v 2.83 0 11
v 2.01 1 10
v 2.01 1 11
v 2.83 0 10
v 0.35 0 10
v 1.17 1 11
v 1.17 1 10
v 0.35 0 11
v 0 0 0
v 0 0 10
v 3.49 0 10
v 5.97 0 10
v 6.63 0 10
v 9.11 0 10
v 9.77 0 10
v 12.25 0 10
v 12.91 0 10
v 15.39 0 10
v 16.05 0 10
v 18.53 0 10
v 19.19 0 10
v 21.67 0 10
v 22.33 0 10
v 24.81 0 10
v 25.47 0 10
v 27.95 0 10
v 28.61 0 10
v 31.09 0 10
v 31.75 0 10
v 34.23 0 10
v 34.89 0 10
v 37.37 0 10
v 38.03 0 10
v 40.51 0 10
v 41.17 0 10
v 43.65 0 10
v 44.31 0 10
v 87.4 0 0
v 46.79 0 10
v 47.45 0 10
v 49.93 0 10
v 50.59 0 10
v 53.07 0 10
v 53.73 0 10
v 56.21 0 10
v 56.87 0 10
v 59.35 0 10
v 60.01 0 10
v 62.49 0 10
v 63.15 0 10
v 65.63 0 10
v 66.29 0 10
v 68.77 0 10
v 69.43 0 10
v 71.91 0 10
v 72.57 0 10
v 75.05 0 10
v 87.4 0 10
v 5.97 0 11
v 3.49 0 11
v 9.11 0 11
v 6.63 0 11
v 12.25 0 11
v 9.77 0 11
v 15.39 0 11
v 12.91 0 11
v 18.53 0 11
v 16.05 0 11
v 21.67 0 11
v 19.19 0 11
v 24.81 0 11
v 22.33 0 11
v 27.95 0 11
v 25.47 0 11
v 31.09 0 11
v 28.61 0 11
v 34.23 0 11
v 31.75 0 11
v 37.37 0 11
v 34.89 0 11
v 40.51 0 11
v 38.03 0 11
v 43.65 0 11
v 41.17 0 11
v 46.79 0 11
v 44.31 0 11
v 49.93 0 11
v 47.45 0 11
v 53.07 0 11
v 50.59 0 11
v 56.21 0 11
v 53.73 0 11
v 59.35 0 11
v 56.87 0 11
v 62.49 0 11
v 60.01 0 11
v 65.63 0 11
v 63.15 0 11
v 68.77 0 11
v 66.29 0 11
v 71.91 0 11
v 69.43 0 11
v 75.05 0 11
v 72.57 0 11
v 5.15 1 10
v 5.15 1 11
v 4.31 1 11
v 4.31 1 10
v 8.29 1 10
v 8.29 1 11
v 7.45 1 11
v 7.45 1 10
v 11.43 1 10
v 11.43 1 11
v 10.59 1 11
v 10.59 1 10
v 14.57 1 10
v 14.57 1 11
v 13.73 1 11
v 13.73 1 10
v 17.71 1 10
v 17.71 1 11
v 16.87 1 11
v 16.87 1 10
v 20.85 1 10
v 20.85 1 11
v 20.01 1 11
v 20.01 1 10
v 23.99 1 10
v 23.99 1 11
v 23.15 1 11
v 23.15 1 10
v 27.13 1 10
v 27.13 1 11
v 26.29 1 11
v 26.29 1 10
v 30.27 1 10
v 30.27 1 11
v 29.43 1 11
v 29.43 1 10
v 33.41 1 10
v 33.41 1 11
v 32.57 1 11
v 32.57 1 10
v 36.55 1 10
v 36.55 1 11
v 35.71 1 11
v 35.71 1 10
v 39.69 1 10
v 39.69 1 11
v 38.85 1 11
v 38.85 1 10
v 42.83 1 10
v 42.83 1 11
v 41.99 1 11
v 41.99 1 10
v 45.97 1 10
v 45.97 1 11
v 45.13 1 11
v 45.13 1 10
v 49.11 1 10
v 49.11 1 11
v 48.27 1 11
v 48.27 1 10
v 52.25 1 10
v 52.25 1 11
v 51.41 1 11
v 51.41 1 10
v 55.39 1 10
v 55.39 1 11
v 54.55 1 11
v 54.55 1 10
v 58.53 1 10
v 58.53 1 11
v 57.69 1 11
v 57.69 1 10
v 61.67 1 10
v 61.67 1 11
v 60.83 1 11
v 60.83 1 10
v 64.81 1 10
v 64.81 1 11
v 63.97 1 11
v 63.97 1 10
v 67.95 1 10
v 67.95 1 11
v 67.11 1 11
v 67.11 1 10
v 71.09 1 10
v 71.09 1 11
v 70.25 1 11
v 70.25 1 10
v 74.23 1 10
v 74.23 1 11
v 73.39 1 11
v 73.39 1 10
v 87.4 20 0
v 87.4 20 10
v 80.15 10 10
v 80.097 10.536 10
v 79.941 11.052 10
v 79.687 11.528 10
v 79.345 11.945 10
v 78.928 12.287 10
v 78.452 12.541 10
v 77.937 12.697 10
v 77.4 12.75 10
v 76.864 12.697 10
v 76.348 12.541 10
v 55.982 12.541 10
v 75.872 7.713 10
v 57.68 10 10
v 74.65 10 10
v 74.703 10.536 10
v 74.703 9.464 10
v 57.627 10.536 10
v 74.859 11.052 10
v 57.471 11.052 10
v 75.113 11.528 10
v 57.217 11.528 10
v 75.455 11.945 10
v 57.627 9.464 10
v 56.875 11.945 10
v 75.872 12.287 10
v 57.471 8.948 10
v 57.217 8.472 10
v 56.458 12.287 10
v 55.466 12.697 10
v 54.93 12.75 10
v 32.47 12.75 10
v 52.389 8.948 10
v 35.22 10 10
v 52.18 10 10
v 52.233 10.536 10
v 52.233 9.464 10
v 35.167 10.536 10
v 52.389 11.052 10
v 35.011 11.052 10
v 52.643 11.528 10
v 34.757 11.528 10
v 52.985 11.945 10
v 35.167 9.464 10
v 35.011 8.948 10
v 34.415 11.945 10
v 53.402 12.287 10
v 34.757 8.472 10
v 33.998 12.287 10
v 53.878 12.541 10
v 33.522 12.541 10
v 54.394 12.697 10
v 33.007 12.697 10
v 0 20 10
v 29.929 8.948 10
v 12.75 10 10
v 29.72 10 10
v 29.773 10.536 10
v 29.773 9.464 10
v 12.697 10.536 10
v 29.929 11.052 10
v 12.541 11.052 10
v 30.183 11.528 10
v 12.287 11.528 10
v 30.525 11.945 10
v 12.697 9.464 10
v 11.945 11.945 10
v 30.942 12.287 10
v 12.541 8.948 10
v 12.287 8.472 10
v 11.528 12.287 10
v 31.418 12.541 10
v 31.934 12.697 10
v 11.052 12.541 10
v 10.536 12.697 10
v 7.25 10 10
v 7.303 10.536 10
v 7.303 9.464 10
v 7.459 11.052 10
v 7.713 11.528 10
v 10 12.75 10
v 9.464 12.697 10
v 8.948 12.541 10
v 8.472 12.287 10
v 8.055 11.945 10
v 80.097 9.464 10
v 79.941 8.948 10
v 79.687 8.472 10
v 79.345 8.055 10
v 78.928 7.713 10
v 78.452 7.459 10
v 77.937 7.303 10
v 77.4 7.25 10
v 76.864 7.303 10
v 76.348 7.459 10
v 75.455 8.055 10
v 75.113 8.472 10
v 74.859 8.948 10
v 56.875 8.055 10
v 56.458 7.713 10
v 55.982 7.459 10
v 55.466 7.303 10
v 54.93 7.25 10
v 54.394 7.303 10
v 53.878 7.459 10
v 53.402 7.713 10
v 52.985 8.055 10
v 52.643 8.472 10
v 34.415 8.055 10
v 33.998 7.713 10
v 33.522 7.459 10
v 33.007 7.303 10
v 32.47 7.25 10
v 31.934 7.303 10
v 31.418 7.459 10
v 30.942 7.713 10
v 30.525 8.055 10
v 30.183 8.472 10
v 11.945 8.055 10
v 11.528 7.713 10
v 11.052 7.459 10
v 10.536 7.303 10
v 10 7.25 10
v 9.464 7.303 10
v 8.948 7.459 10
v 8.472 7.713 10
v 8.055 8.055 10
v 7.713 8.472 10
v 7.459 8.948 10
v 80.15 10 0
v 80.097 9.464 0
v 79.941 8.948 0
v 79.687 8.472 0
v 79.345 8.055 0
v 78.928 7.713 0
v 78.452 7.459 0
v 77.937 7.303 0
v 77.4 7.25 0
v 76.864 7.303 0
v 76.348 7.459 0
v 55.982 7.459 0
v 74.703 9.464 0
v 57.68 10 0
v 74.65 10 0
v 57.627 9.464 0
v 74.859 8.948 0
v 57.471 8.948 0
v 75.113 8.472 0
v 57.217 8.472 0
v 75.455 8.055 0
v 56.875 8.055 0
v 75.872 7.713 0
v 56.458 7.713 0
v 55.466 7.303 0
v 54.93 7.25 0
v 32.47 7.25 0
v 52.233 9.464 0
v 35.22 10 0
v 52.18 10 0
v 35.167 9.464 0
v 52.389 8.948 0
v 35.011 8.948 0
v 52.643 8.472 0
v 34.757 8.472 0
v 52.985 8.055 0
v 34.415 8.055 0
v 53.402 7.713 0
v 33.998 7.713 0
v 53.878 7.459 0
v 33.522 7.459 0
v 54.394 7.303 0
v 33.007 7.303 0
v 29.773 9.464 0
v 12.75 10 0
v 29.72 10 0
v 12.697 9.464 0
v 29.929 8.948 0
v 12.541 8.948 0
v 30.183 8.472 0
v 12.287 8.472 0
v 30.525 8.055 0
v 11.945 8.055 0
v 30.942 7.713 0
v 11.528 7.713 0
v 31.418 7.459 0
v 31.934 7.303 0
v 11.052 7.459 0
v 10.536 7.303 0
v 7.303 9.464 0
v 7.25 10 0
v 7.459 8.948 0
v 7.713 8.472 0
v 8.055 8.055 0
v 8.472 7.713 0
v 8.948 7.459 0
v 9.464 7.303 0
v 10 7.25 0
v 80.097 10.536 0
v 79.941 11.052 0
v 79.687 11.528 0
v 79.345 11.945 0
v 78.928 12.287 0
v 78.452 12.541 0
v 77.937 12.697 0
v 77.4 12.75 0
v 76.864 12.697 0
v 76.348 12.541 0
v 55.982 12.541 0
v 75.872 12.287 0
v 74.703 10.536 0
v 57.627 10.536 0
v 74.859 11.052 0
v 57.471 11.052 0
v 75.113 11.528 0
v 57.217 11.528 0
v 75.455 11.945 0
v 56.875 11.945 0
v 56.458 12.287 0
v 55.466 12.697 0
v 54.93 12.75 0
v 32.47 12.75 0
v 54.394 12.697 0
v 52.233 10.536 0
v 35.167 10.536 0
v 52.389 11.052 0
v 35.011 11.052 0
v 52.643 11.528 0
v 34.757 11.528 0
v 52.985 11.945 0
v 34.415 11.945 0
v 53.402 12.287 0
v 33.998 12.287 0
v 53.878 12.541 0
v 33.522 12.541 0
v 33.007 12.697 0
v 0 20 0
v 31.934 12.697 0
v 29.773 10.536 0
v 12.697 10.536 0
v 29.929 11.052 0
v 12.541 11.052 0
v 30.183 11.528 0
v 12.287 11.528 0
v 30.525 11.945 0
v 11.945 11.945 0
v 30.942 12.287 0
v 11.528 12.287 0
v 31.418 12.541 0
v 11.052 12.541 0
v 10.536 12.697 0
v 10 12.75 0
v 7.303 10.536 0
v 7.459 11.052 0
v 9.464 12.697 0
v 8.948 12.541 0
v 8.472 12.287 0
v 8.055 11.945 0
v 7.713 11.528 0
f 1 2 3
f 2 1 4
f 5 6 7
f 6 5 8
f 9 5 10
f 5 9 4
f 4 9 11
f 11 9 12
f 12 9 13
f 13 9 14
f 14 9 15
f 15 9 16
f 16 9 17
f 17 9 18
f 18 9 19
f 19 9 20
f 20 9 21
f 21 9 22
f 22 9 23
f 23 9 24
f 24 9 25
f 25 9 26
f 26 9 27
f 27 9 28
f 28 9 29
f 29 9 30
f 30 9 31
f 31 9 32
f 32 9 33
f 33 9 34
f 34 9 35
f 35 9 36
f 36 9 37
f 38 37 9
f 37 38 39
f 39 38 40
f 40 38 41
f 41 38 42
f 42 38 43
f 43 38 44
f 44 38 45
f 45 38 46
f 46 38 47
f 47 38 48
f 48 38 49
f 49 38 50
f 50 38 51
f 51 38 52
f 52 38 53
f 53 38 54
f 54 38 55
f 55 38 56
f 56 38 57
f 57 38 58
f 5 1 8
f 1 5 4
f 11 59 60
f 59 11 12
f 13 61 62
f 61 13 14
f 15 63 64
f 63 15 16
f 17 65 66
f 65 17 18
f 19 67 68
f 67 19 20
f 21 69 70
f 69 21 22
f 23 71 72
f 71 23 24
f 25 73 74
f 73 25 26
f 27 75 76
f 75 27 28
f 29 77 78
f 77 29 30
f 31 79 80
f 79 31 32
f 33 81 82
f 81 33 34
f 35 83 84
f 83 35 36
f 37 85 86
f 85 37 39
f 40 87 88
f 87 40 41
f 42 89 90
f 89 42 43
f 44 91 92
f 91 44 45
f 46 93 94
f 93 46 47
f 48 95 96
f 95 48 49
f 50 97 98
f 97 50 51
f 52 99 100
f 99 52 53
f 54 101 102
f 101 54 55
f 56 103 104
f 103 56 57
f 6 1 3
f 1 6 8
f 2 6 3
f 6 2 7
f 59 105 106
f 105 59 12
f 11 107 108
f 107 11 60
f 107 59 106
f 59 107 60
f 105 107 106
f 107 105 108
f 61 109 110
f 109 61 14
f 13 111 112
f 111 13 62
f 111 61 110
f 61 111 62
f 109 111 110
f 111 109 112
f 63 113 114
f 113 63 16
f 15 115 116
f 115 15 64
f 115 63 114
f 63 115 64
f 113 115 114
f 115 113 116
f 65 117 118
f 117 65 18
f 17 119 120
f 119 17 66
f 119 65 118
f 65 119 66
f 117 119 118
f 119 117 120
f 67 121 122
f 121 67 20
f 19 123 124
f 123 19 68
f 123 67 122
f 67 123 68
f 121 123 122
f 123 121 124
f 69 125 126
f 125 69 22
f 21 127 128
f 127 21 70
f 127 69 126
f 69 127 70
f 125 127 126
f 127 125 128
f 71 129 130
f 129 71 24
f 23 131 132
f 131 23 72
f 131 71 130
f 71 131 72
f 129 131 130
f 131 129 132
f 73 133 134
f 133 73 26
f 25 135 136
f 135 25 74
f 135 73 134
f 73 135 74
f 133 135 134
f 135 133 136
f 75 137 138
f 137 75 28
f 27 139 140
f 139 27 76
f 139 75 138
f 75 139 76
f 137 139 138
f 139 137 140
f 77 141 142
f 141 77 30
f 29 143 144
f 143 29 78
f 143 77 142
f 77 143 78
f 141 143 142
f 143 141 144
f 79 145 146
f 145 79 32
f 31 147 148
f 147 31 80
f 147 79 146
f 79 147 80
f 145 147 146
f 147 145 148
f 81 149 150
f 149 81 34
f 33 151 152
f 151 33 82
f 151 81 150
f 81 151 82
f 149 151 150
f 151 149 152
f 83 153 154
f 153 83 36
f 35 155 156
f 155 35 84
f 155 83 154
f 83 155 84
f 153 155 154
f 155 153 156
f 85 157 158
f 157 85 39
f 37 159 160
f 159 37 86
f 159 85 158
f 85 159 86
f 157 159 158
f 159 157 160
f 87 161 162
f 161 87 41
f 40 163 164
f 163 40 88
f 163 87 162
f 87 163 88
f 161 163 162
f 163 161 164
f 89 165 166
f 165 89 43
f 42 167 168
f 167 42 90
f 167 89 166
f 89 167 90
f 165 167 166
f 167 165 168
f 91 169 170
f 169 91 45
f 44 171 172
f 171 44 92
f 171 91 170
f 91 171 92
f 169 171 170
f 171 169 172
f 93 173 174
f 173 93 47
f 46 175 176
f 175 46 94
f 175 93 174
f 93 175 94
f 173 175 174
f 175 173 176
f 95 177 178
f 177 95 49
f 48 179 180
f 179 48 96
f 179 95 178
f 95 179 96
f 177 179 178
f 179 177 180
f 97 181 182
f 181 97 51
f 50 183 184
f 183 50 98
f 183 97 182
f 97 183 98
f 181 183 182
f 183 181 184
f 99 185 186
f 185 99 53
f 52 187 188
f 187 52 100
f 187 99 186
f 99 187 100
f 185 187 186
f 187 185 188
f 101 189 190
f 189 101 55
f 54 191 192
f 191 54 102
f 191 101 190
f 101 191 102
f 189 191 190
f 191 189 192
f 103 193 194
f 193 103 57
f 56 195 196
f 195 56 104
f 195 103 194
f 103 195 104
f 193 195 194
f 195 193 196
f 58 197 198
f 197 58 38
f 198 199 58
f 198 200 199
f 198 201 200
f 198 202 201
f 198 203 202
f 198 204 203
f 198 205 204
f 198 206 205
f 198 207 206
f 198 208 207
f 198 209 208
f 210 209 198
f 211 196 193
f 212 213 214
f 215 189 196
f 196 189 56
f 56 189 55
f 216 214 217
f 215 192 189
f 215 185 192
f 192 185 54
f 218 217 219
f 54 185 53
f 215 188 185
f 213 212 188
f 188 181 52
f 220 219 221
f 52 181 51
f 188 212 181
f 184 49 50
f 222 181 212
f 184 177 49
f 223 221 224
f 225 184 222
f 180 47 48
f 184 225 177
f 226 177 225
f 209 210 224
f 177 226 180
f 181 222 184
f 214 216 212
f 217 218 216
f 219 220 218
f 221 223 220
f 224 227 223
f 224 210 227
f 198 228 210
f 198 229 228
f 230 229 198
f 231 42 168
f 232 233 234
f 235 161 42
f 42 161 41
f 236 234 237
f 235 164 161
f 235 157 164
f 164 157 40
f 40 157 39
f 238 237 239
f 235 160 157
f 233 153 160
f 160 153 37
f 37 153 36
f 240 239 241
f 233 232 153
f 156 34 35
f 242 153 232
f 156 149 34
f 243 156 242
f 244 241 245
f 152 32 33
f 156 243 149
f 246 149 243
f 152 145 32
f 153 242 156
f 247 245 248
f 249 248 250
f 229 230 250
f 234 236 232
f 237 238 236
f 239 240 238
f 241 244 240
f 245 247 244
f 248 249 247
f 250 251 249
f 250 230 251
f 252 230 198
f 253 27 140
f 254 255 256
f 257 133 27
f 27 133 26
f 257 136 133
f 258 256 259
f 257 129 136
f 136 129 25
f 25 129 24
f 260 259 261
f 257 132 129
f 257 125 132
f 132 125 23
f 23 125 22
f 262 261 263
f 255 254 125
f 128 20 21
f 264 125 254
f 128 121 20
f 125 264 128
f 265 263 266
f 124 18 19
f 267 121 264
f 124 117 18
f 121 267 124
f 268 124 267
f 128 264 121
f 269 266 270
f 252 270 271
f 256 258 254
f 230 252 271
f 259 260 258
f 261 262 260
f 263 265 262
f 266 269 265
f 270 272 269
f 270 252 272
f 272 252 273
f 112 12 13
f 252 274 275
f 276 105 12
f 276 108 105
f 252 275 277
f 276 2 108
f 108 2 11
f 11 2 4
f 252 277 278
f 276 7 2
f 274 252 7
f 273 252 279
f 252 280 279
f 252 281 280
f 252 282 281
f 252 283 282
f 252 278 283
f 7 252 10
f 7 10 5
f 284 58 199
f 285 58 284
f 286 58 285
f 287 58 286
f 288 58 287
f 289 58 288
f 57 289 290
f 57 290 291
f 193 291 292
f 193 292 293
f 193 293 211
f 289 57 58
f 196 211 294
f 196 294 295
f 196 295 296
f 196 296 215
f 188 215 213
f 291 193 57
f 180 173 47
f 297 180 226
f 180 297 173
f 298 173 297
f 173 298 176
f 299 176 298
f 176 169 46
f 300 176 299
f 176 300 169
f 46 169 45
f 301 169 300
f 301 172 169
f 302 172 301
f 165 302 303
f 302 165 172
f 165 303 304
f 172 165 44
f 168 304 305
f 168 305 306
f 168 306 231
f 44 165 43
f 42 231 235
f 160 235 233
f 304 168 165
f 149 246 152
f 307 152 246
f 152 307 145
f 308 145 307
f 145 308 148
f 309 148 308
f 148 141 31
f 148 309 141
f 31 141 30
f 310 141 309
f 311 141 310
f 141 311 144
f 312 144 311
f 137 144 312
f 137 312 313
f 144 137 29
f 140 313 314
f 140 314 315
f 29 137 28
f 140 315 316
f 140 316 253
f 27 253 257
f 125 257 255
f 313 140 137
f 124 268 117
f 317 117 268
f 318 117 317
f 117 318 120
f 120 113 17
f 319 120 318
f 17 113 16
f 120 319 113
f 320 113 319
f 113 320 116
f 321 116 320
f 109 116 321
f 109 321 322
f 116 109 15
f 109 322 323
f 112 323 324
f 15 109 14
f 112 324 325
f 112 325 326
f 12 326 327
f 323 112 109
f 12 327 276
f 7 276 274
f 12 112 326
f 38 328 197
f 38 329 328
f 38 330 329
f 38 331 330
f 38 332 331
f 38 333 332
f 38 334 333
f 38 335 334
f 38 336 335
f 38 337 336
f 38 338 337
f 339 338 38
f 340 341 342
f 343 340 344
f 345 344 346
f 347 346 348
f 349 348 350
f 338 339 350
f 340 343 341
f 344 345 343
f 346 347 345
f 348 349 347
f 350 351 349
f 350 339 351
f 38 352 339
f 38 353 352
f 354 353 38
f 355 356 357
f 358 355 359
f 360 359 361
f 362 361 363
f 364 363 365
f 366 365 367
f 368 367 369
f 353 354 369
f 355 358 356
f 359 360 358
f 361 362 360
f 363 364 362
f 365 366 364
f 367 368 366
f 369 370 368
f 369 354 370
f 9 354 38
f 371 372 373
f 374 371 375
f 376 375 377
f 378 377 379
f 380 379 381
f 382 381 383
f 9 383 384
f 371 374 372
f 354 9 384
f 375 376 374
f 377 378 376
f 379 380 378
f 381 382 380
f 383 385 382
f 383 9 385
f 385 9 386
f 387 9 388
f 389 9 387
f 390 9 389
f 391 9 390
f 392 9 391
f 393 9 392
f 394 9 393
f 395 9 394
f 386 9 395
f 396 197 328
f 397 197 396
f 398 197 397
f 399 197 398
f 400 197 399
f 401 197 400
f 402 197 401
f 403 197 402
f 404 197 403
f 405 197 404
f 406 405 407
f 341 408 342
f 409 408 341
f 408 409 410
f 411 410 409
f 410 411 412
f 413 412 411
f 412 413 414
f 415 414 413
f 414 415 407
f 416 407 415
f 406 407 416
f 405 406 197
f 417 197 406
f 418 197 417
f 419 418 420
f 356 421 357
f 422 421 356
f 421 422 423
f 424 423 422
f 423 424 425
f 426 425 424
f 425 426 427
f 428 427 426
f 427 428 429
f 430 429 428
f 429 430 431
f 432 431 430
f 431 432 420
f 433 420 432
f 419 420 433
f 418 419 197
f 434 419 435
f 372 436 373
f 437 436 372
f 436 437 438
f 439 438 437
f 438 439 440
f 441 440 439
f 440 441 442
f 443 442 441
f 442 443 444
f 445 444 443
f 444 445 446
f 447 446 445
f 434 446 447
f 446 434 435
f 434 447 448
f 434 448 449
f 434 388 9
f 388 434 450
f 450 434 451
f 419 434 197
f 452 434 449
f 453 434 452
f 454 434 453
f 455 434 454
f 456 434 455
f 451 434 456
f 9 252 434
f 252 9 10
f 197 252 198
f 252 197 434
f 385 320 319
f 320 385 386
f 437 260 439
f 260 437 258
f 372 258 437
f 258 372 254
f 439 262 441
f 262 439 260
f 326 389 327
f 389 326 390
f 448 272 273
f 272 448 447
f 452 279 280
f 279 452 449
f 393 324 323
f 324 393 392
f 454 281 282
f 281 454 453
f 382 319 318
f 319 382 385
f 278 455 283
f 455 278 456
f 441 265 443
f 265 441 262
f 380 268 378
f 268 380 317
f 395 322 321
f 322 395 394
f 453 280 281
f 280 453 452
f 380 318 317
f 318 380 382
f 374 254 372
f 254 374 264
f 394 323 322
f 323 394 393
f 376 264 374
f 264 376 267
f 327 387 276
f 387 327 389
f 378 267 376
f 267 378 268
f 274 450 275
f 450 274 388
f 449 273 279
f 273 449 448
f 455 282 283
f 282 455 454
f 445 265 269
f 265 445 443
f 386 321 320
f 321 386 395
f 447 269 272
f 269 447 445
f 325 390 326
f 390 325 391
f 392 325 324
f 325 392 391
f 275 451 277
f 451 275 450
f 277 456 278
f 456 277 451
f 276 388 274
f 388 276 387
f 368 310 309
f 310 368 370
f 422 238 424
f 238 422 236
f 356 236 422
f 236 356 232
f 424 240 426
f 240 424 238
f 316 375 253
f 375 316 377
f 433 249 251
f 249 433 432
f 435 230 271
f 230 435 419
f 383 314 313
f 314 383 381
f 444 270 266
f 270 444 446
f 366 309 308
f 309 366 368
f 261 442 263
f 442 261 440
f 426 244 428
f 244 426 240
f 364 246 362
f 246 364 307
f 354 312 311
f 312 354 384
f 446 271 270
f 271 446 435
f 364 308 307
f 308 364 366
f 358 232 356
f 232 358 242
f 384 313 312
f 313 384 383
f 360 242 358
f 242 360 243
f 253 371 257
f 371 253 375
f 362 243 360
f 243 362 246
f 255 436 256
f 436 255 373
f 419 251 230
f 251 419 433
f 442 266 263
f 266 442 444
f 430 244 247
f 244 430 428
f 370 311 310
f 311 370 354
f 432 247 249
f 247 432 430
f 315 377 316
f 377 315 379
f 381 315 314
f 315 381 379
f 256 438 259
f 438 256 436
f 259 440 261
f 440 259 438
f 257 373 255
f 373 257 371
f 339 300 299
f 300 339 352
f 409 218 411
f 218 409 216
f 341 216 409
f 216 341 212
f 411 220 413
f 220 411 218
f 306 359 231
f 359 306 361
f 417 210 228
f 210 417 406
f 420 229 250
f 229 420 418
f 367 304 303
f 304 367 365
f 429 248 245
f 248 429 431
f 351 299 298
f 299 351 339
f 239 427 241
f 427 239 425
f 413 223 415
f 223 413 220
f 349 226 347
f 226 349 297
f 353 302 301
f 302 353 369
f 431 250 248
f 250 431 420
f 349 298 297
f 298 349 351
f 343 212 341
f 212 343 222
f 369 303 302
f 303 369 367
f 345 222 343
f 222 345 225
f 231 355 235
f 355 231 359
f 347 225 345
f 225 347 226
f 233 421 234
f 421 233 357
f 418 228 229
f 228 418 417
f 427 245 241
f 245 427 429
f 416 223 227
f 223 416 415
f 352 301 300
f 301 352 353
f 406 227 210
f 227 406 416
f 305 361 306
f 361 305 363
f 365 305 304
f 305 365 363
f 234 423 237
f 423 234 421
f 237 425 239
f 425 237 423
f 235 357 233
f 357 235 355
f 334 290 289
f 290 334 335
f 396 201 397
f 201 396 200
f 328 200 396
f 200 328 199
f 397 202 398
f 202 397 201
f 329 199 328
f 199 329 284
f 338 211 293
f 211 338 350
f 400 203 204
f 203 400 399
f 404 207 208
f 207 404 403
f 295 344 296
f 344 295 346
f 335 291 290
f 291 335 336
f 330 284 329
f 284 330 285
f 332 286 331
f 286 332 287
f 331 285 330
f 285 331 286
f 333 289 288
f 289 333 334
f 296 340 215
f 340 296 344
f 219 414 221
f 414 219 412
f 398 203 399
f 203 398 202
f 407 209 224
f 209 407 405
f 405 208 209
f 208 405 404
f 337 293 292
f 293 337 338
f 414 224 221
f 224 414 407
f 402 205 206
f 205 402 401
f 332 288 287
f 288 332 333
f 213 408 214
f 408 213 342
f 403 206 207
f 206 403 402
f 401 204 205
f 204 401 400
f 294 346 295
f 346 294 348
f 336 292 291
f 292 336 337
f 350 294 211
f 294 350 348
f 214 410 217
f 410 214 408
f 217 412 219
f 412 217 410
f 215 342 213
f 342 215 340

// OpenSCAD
$fn = 32;

// ----------------------------------------------------------------------
// Gear rack: m=1 z=24, 87.4 x 20 x 11 mm
// ----------------------------------------------------------------------

// --- parameters (mm) ---
length = 87.4;            // rack length, X
width = 20;               // rack width, Y
height = 11;              // overall height, Z
module_m = 1;             // module
back_t = 10;              // tooth root line height
pitch = 3.14;             // circular pitch
tip_w = 0.84;             // tooth thickness at the tip
root_w = 2.48;            // tooth thickness at the root line
hole_d = 5.5;             // mounting hole
sink = 0.6;               // tooth root overlap into the body

tooth_span = 75.4;

module tooth(x0) {
  /* 20 deg flank profile, sunk into the body for a positive overlap */
  translate([x0, 0, back_t - sink])
    linear_extrude(height = height - back_t + sink)
      polygon(points = [[-root_w / 2, 0], [root_w / 2, 0],
                        [tip_w / 2, height - back_t],
                        [-tip_w / 2, height - back_t]]);
}

difference() {
  union() {
    cube([length, width, back_t]);
    for (i = [0 : 24 - 1])
      tooth((i + 0.5) * pitch + (tooth_span - 24 * pitch) / 2);
  }
  translate([10, 10, -1]) cylinder(h = back_t + 2, d = hole_d);
  translate([32.47, 10, -1]) cylinder(h = back_t + 2, d = hole_d);
  translate([54.93, 10, -1]) cylinder(h = back_t + 2, d = hole_d);
  translate([77.4, 10, -1]) cylinder(h = back_t + 2, d = hole_d);
}
